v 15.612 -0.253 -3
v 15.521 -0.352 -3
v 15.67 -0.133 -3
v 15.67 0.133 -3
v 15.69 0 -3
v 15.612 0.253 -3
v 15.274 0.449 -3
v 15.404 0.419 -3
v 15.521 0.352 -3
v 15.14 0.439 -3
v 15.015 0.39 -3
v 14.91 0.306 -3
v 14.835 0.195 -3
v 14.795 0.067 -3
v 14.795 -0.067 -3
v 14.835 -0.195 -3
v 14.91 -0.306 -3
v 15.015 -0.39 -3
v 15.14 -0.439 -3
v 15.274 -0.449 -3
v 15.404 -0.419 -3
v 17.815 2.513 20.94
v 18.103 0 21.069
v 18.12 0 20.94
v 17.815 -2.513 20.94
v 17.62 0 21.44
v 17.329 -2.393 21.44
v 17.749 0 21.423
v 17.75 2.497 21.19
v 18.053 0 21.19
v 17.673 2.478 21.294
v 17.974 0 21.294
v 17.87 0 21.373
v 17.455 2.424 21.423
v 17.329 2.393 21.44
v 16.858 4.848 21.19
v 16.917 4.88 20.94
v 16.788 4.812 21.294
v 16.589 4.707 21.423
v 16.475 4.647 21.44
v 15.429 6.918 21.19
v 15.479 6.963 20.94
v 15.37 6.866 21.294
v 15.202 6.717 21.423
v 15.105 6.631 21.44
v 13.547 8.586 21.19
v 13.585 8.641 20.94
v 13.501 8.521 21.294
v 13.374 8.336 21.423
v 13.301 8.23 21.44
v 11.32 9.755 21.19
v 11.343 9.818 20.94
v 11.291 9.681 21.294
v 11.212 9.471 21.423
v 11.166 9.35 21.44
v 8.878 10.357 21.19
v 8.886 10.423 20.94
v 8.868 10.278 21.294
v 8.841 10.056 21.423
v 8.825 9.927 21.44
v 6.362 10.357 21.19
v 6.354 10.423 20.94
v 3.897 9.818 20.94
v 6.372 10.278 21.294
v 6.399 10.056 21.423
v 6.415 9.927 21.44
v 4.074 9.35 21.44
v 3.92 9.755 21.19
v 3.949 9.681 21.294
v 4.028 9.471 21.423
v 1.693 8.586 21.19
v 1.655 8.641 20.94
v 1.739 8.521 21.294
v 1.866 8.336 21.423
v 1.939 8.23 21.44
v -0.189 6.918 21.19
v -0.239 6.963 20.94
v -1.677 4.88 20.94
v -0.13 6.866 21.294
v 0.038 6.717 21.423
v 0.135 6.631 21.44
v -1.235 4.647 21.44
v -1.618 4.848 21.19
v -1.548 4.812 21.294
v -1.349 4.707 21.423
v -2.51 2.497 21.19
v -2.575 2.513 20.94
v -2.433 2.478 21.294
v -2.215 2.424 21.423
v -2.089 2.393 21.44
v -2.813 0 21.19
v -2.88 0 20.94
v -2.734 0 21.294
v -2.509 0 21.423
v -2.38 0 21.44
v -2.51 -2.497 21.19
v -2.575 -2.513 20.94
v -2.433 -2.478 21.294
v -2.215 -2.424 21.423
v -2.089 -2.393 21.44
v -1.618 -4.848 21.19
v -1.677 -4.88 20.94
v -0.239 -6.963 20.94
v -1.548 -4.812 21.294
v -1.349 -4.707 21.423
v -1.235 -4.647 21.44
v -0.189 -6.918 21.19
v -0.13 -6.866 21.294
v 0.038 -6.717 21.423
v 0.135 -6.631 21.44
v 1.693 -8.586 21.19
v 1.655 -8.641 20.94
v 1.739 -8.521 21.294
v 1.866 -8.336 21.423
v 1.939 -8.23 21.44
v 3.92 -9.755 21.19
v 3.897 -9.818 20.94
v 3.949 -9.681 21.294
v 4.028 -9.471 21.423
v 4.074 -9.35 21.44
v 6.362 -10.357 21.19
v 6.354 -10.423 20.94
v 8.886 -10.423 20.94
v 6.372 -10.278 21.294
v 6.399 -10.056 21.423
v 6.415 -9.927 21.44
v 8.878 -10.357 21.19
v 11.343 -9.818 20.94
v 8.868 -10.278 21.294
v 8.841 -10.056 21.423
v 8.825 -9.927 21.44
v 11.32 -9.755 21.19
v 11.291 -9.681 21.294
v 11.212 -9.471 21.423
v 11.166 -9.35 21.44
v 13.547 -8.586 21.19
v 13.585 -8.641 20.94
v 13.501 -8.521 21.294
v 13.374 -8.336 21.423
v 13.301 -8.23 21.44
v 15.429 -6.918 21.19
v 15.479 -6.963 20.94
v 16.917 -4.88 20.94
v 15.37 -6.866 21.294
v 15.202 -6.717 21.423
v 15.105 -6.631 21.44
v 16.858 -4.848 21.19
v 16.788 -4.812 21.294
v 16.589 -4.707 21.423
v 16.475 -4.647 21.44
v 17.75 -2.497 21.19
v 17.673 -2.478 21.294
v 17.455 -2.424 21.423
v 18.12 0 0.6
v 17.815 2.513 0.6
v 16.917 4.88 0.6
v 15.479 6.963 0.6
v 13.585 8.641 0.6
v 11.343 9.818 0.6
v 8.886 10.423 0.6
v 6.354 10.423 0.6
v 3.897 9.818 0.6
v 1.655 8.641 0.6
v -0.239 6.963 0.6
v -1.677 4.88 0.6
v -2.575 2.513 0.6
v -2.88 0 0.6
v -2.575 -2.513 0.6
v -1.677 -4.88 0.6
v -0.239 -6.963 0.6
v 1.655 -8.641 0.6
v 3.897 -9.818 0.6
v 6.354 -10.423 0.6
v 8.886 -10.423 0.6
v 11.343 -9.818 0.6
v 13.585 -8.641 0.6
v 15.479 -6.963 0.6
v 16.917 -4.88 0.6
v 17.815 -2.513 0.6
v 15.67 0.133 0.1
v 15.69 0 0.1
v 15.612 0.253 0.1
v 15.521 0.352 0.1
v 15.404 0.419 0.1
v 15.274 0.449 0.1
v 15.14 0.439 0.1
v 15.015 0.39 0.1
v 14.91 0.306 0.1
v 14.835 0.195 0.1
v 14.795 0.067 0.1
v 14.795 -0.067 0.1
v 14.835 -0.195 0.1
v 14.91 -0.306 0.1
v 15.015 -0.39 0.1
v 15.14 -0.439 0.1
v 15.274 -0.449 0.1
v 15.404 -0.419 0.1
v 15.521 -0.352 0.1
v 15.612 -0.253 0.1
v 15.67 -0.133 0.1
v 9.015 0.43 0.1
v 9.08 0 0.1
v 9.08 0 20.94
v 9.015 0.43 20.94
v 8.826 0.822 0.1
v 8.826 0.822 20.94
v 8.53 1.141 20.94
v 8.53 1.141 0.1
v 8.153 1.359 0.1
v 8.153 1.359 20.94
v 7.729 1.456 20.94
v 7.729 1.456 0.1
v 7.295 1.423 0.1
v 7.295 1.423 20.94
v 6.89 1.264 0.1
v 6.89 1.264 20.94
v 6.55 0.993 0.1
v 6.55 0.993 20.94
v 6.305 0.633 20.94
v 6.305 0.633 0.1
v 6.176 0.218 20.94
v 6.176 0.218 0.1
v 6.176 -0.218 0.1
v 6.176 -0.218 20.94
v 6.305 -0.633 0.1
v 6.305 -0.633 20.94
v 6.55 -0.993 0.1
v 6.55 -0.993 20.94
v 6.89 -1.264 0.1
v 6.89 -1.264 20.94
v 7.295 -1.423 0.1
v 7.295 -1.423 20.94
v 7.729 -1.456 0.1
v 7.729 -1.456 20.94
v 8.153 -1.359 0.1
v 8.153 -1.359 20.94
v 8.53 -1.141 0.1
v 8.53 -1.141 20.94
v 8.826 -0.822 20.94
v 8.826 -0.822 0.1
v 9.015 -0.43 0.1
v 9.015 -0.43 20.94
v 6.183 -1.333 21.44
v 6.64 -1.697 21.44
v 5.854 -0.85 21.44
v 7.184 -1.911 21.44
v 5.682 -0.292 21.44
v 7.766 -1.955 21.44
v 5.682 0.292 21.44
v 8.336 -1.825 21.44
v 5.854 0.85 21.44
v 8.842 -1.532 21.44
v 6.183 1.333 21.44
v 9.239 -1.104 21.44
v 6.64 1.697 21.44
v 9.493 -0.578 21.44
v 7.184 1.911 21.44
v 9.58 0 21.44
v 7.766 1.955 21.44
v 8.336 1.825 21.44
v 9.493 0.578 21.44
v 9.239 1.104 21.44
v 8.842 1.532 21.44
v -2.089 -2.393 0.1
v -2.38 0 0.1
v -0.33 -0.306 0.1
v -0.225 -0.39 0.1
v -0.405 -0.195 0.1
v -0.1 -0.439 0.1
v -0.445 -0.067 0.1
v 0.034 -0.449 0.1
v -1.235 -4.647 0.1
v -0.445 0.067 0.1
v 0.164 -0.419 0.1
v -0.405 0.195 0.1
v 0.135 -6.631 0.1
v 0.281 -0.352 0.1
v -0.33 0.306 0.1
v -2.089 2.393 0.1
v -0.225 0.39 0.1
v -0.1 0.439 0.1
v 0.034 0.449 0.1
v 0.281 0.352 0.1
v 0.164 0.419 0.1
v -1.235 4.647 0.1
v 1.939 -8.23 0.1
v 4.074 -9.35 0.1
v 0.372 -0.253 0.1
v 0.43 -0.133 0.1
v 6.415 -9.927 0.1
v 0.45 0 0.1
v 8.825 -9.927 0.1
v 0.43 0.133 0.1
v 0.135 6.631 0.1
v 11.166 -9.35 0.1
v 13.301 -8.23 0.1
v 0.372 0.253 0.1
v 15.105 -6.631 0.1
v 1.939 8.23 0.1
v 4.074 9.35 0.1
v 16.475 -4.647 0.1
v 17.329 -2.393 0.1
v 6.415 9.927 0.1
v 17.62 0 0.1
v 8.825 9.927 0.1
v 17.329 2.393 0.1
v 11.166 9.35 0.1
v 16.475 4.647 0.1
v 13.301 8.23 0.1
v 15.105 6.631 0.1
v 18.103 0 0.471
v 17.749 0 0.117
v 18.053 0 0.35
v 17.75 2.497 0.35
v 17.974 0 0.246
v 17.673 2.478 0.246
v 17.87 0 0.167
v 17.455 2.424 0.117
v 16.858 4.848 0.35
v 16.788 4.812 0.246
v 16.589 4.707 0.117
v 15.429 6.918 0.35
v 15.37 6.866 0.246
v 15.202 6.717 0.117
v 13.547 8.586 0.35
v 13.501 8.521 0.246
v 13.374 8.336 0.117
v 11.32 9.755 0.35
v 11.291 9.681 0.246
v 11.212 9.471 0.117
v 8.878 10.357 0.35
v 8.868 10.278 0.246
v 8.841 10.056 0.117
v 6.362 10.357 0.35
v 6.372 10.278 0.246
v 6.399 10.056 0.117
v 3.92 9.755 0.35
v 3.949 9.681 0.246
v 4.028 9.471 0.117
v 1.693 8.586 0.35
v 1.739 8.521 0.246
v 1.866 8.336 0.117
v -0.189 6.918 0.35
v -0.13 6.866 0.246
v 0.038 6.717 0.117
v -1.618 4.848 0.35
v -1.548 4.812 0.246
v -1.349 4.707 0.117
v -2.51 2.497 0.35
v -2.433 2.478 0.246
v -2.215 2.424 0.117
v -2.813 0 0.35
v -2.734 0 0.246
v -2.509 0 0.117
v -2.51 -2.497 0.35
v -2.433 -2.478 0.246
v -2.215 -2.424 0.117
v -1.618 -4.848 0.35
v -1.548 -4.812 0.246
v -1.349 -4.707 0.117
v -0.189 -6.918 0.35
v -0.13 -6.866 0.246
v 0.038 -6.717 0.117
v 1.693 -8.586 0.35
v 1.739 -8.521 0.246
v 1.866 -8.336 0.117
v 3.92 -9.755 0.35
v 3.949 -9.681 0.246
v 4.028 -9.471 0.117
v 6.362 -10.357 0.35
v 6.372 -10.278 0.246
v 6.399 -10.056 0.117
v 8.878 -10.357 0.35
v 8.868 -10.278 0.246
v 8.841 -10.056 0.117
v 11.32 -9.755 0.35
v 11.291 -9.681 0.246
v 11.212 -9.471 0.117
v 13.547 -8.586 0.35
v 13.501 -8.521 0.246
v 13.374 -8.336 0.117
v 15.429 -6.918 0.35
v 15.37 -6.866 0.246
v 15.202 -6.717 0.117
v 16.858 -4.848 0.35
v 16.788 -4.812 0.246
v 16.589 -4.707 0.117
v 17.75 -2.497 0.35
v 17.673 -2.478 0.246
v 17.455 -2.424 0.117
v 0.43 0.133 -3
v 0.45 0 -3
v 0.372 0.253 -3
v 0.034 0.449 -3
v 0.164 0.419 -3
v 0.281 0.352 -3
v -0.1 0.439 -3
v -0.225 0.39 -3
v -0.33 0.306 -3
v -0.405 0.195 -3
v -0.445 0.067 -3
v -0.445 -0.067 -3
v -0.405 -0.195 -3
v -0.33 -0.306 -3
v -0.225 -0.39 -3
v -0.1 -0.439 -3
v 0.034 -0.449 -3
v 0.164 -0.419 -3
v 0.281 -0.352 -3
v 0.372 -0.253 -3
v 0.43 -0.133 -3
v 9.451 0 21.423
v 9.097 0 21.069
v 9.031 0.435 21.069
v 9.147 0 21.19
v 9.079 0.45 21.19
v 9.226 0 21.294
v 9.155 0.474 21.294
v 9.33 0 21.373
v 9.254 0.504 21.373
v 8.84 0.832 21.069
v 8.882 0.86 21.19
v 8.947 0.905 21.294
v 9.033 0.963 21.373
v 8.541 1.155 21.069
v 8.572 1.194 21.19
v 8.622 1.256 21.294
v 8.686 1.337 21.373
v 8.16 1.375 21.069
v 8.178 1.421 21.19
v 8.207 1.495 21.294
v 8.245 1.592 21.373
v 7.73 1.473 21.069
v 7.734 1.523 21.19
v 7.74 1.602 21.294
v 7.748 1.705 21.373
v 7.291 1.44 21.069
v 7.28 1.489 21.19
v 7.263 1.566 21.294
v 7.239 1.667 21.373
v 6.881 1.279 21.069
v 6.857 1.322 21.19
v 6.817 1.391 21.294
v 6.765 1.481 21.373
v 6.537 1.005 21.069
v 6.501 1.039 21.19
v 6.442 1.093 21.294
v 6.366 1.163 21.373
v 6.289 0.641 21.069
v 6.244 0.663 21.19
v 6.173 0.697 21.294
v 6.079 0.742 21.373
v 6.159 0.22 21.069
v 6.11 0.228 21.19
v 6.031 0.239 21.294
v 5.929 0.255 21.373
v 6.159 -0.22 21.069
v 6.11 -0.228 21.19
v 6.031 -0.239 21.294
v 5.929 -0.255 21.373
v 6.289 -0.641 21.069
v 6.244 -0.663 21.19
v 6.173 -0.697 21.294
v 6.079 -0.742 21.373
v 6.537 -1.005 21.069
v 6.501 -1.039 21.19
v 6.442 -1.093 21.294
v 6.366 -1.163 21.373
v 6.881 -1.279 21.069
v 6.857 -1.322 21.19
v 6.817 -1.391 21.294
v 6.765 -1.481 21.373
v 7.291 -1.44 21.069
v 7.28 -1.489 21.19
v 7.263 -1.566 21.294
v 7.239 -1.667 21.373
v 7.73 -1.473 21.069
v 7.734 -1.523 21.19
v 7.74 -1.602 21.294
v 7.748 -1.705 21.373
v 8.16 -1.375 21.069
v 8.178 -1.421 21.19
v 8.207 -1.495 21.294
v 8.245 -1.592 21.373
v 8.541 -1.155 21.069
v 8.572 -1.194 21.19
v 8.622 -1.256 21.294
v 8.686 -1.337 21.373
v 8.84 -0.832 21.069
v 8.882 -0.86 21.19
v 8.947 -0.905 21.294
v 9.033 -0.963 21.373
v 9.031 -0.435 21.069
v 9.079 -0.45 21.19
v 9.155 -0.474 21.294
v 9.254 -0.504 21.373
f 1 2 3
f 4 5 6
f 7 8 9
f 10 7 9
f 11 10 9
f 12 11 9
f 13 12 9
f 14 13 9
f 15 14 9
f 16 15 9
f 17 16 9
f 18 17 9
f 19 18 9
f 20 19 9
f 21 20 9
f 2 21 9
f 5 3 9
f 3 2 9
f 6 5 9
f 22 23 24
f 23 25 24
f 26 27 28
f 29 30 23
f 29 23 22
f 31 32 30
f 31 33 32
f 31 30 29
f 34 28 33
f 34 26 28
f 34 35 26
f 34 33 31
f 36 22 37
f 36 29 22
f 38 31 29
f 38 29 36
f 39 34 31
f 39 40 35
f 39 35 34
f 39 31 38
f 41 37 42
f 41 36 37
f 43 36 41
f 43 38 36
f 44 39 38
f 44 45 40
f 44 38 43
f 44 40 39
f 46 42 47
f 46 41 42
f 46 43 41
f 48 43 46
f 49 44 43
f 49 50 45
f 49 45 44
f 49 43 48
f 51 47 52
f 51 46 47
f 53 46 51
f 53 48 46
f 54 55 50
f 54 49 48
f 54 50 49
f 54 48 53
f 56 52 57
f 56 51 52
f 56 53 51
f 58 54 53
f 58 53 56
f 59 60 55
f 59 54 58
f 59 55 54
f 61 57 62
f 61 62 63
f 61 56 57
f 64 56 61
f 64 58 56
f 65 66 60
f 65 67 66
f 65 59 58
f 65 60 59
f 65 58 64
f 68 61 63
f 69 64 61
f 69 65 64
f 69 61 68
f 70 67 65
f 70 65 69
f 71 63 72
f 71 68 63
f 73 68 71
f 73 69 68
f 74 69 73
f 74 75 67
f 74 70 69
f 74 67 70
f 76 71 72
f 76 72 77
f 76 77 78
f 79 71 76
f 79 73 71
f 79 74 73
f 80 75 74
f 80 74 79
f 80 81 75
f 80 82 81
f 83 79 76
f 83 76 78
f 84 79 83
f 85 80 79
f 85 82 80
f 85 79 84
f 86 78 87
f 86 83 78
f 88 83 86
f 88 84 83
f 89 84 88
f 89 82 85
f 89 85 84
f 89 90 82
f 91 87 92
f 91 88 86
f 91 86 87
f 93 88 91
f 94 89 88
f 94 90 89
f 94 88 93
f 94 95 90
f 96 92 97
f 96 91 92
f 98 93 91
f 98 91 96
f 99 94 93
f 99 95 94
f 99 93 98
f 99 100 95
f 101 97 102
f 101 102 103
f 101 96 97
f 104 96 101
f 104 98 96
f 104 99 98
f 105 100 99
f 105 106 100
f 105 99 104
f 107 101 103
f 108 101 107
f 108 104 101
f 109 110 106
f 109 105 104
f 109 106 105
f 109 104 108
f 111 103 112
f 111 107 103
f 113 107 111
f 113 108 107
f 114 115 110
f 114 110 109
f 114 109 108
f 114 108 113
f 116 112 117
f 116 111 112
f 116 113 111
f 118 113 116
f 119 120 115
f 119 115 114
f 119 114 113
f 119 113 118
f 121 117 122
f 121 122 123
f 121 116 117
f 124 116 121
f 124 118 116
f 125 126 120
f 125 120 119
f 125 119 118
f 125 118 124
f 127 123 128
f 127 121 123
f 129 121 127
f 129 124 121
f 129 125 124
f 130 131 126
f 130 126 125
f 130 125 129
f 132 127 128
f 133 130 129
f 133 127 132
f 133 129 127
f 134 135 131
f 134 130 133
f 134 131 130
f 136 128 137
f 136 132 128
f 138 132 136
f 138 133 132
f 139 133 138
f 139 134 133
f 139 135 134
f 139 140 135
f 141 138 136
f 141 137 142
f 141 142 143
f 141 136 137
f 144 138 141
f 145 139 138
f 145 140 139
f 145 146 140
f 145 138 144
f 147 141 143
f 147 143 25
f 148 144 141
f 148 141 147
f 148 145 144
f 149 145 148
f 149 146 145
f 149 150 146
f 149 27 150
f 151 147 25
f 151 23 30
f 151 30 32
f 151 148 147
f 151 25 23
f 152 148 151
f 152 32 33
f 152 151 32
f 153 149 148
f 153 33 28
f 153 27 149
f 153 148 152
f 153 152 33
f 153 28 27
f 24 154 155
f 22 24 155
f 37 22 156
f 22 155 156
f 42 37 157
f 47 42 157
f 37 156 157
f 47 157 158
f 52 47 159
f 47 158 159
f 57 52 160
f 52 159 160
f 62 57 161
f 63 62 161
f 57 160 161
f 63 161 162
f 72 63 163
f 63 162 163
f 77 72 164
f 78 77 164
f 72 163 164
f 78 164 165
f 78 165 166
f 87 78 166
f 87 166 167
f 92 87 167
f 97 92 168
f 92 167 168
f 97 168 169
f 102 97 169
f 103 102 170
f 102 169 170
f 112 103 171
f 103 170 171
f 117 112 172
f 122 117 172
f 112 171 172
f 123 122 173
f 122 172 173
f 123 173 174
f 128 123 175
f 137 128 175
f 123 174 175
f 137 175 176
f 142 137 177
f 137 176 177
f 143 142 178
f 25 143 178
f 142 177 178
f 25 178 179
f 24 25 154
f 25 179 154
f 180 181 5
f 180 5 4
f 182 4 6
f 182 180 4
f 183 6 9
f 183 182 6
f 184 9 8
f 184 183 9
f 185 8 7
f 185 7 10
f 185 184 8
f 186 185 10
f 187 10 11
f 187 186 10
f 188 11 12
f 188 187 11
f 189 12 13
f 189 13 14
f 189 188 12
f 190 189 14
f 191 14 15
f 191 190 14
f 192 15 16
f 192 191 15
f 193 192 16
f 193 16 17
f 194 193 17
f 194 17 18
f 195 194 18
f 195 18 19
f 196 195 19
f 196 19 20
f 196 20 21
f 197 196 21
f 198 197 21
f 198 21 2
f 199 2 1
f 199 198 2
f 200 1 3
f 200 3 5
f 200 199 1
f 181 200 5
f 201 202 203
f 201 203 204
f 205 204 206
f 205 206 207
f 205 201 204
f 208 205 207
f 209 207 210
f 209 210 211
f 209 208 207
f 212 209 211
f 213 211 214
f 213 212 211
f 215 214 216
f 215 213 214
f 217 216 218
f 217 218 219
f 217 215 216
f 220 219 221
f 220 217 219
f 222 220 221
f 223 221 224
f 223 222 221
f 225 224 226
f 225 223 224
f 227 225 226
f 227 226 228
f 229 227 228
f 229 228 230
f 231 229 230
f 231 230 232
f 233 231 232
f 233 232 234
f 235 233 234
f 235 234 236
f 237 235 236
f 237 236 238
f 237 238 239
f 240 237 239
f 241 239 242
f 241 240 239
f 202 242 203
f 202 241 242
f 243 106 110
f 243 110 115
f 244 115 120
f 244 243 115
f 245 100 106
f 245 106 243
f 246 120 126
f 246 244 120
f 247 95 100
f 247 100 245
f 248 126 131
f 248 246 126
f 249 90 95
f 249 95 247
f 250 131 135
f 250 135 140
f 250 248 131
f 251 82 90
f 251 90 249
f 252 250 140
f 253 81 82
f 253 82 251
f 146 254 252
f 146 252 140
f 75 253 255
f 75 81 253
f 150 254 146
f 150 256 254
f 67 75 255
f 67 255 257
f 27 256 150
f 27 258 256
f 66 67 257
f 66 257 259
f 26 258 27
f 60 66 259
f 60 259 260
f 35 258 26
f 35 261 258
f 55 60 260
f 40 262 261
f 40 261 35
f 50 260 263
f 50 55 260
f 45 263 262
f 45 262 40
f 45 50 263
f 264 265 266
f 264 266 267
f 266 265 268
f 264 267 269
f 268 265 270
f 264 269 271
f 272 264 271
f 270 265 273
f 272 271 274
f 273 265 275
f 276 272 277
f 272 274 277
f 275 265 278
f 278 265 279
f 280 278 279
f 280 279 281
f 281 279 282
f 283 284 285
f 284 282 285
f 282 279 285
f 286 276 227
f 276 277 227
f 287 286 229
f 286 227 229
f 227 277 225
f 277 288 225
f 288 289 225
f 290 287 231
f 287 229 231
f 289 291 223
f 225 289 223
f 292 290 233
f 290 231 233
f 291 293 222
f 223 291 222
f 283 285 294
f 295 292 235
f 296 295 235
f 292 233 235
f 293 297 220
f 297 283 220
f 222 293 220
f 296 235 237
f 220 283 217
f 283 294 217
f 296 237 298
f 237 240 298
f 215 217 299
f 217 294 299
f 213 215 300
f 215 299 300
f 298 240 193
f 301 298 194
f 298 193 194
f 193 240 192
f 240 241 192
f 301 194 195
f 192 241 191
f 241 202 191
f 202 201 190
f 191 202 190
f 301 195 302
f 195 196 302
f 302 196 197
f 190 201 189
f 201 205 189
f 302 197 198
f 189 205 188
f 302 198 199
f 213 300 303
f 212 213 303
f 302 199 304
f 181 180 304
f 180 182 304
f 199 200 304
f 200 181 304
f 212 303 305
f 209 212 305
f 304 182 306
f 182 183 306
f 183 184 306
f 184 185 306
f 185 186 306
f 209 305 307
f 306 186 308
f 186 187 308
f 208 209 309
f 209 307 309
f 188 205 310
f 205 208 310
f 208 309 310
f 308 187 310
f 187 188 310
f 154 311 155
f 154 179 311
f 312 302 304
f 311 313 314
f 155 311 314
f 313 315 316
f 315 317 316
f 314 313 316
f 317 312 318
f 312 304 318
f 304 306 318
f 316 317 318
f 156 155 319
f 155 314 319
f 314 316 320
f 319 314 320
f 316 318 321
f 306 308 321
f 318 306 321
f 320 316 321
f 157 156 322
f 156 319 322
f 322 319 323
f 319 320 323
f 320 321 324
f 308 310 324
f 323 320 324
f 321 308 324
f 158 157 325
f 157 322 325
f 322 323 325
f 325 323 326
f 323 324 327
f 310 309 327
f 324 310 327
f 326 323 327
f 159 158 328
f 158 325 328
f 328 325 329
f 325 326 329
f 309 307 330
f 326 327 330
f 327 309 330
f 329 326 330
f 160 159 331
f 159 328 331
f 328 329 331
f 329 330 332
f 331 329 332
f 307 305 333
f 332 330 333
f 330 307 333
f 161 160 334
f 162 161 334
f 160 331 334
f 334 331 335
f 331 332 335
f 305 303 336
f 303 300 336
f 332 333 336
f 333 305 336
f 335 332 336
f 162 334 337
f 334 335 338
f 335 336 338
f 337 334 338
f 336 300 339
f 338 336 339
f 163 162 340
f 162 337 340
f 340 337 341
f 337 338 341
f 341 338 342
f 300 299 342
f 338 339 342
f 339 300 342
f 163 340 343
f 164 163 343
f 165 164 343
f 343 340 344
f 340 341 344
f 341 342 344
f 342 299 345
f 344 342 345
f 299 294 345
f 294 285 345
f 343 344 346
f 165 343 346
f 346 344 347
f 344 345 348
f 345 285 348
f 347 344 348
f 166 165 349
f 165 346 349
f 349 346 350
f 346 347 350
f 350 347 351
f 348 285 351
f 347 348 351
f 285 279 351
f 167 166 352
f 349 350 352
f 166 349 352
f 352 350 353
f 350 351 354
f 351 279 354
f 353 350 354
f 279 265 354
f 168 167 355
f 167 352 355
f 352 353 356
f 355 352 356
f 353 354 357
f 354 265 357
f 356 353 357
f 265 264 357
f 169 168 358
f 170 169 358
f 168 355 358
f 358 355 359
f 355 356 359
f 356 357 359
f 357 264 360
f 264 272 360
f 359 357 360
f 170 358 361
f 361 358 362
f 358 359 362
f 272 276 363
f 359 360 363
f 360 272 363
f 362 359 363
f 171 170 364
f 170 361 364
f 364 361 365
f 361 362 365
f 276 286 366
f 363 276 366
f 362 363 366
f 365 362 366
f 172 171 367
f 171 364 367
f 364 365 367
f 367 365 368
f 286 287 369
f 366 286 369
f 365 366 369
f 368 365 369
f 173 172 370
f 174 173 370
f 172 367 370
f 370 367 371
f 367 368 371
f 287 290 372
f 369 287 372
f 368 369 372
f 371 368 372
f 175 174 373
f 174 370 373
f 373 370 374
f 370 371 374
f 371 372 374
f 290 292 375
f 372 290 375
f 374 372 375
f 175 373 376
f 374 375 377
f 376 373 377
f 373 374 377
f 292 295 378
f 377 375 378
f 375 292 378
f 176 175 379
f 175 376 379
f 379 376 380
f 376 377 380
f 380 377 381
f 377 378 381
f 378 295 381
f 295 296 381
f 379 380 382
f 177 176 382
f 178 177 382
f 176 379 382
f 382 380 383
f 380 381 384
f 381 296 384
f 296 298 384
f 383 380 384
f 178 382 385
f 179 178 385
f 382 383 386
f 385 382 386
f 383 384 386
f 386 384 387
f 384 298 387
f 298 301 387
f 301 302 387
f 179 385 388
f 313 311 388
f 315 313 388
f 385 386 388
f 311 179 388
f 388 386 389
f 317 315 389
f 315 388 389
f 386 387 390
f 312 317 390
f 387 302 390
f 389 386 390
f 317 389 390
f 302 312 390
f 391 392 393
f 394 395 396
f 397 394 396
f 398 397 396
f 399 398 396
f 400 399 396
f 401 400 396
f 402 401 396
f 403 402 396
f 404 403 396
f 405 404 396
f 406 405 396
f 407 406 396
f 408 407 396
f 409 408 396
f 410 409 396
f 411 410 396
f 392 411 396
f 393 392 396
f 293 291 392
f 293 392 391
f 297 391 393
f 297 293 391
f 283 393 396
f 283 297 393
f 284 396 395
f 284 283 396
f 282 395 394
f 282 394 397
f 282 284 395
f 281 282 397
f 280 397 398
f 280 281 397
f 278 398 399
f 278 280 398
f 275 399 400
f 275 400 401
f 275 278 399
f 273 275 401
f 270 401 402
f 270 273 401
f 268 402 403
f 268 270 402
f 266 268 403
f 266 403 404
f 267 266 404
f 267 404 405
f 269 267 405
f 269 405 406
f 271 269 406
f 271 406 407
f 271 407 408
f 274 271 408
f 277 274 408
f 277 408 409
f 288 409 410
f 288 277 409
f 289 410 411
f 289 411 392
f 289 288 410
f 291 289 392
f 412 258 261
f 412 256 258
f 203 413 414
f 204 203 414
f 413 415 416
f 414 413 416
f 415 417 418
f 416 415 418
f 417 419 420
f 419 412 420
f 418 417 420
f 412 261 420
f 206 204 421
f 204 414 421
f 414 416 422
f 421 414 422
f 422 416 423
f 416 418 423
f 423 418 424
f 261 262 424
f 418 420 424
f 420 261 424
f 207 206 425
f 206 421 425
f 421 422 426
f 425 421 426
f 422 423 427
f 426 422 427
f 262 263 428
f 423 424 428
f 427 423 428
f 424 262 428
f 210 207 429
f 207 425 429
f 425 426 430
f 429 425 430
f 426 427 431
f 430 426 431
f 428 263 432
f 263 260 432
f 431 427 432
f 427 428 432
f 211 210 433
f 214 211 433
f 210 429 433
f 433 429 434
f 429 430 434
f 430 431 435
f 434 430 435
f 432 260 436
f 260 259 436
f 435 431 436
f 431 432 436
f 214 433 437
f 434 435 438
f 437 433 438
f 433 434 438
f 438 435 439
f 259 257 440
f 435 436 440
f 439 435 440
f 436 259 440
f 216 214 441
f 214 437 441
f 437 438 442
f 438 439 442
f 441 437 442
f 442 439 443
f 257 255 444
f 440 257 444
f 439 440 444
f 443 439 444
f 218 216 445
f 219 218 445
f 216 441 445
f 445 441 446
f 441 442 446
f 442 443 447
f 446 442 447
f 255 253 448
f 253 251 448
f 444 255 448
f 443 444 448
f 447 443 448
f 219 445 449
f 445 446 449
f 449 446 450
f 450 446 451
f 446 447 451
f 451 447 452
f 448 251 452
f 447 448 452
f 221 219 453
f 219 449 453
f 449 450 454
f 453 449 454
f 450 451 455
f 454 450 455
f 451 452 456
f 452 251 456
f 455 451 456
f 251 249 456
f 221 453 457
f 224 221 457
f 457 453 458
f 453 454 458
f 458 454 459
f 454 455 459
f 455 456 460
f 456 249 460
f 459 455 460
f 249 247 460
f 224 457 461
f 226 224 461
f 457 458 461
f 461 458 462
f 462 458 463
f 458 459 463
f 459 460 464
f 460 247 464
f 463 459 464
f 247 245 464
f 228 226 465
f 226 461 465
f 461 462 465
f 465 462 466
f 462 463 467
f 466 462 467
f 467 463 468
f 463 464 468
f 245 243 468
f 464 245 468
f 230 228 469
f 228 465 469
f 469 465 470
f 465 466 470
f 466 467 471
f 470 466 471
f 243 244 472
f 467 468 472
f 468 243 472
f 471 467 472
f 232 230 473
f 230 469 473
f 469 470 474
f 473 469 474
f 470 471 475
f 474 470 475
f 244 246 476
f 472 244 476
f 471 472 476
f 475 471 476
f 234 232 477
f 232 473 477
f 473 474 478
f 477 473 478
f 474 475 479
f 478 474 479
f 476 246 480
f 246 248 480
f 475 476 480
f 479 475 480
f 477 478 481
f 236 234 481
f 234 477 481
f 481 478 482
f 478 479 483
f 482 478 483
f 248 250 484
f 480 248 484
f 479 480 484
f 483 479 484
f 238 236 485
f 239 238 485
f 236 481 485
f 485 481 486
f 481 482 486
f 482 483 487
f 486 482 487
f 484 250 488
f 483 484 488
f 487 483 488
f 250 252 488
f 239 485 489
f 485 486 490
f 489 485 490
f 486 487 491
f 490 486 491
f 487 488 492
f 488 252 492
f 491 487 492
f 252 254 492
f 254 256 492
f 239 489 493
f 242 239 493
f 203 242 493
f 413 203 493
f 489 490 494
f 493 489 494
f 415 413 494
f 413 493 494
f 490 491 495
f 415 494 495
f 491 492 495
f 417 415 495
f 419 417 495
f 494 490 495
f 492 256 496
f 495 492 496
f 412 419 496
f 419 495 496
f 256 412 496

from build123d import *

# Parameters (mm, degrees)
SKETCH_R          = 10.5
SKETCH_R_2        = 1.46
PAD_DEPTH         = 21.34
FILLET_R          = 0.5
SKETCH001_R       = 0.45
PAD001_DEPTH      = 10.67
PAD001_DEPTH_BACK = 3.5


with BuildPart() as fillet_body:
    # Sketch → Pad (new body)
    with BuildSketch(Plane.XY.offset(0.1)):
        with Locations((7.62, 0)):
            Circle(SKETCH_R)
        with Locations((7.62, 0)):
            Circle(SKETCH_R_2, mode=Mode.SUBTRACT)
    extrude(amount=PAD_DEPTH)

    # Fillet
    fillet_edges = [fillet_body.edges().sort_by_distance(p)[0] for p in [
        (6.16, 0, 21.44),
        (-2.88, 0, 21.44),
        (-2.88, 0, 0.1),
    ]]
    fillet(fillet_edges, radius=FILLET_R)


with BuildPart() as pad001_mp_cp:
    # Sketch001 → Pad001 (new body, two sides)
    with BuildSketch(Plane.XY.offset(0.5)) as pad001_sk:
        Circle(SKETCH001_R)
        with Locations((15.24, 0)):
            Circle(SKETCH001_R)
    extrude(amount=PAD001_DEPTH)
    extrude(pad001_sk.sketch, amount=-PAD001_DEPTH_BACK)

    # Pad001_mp_cp: union Fillet body
    add(fillet_body.part)


solid = pad001_mp_cp.part
